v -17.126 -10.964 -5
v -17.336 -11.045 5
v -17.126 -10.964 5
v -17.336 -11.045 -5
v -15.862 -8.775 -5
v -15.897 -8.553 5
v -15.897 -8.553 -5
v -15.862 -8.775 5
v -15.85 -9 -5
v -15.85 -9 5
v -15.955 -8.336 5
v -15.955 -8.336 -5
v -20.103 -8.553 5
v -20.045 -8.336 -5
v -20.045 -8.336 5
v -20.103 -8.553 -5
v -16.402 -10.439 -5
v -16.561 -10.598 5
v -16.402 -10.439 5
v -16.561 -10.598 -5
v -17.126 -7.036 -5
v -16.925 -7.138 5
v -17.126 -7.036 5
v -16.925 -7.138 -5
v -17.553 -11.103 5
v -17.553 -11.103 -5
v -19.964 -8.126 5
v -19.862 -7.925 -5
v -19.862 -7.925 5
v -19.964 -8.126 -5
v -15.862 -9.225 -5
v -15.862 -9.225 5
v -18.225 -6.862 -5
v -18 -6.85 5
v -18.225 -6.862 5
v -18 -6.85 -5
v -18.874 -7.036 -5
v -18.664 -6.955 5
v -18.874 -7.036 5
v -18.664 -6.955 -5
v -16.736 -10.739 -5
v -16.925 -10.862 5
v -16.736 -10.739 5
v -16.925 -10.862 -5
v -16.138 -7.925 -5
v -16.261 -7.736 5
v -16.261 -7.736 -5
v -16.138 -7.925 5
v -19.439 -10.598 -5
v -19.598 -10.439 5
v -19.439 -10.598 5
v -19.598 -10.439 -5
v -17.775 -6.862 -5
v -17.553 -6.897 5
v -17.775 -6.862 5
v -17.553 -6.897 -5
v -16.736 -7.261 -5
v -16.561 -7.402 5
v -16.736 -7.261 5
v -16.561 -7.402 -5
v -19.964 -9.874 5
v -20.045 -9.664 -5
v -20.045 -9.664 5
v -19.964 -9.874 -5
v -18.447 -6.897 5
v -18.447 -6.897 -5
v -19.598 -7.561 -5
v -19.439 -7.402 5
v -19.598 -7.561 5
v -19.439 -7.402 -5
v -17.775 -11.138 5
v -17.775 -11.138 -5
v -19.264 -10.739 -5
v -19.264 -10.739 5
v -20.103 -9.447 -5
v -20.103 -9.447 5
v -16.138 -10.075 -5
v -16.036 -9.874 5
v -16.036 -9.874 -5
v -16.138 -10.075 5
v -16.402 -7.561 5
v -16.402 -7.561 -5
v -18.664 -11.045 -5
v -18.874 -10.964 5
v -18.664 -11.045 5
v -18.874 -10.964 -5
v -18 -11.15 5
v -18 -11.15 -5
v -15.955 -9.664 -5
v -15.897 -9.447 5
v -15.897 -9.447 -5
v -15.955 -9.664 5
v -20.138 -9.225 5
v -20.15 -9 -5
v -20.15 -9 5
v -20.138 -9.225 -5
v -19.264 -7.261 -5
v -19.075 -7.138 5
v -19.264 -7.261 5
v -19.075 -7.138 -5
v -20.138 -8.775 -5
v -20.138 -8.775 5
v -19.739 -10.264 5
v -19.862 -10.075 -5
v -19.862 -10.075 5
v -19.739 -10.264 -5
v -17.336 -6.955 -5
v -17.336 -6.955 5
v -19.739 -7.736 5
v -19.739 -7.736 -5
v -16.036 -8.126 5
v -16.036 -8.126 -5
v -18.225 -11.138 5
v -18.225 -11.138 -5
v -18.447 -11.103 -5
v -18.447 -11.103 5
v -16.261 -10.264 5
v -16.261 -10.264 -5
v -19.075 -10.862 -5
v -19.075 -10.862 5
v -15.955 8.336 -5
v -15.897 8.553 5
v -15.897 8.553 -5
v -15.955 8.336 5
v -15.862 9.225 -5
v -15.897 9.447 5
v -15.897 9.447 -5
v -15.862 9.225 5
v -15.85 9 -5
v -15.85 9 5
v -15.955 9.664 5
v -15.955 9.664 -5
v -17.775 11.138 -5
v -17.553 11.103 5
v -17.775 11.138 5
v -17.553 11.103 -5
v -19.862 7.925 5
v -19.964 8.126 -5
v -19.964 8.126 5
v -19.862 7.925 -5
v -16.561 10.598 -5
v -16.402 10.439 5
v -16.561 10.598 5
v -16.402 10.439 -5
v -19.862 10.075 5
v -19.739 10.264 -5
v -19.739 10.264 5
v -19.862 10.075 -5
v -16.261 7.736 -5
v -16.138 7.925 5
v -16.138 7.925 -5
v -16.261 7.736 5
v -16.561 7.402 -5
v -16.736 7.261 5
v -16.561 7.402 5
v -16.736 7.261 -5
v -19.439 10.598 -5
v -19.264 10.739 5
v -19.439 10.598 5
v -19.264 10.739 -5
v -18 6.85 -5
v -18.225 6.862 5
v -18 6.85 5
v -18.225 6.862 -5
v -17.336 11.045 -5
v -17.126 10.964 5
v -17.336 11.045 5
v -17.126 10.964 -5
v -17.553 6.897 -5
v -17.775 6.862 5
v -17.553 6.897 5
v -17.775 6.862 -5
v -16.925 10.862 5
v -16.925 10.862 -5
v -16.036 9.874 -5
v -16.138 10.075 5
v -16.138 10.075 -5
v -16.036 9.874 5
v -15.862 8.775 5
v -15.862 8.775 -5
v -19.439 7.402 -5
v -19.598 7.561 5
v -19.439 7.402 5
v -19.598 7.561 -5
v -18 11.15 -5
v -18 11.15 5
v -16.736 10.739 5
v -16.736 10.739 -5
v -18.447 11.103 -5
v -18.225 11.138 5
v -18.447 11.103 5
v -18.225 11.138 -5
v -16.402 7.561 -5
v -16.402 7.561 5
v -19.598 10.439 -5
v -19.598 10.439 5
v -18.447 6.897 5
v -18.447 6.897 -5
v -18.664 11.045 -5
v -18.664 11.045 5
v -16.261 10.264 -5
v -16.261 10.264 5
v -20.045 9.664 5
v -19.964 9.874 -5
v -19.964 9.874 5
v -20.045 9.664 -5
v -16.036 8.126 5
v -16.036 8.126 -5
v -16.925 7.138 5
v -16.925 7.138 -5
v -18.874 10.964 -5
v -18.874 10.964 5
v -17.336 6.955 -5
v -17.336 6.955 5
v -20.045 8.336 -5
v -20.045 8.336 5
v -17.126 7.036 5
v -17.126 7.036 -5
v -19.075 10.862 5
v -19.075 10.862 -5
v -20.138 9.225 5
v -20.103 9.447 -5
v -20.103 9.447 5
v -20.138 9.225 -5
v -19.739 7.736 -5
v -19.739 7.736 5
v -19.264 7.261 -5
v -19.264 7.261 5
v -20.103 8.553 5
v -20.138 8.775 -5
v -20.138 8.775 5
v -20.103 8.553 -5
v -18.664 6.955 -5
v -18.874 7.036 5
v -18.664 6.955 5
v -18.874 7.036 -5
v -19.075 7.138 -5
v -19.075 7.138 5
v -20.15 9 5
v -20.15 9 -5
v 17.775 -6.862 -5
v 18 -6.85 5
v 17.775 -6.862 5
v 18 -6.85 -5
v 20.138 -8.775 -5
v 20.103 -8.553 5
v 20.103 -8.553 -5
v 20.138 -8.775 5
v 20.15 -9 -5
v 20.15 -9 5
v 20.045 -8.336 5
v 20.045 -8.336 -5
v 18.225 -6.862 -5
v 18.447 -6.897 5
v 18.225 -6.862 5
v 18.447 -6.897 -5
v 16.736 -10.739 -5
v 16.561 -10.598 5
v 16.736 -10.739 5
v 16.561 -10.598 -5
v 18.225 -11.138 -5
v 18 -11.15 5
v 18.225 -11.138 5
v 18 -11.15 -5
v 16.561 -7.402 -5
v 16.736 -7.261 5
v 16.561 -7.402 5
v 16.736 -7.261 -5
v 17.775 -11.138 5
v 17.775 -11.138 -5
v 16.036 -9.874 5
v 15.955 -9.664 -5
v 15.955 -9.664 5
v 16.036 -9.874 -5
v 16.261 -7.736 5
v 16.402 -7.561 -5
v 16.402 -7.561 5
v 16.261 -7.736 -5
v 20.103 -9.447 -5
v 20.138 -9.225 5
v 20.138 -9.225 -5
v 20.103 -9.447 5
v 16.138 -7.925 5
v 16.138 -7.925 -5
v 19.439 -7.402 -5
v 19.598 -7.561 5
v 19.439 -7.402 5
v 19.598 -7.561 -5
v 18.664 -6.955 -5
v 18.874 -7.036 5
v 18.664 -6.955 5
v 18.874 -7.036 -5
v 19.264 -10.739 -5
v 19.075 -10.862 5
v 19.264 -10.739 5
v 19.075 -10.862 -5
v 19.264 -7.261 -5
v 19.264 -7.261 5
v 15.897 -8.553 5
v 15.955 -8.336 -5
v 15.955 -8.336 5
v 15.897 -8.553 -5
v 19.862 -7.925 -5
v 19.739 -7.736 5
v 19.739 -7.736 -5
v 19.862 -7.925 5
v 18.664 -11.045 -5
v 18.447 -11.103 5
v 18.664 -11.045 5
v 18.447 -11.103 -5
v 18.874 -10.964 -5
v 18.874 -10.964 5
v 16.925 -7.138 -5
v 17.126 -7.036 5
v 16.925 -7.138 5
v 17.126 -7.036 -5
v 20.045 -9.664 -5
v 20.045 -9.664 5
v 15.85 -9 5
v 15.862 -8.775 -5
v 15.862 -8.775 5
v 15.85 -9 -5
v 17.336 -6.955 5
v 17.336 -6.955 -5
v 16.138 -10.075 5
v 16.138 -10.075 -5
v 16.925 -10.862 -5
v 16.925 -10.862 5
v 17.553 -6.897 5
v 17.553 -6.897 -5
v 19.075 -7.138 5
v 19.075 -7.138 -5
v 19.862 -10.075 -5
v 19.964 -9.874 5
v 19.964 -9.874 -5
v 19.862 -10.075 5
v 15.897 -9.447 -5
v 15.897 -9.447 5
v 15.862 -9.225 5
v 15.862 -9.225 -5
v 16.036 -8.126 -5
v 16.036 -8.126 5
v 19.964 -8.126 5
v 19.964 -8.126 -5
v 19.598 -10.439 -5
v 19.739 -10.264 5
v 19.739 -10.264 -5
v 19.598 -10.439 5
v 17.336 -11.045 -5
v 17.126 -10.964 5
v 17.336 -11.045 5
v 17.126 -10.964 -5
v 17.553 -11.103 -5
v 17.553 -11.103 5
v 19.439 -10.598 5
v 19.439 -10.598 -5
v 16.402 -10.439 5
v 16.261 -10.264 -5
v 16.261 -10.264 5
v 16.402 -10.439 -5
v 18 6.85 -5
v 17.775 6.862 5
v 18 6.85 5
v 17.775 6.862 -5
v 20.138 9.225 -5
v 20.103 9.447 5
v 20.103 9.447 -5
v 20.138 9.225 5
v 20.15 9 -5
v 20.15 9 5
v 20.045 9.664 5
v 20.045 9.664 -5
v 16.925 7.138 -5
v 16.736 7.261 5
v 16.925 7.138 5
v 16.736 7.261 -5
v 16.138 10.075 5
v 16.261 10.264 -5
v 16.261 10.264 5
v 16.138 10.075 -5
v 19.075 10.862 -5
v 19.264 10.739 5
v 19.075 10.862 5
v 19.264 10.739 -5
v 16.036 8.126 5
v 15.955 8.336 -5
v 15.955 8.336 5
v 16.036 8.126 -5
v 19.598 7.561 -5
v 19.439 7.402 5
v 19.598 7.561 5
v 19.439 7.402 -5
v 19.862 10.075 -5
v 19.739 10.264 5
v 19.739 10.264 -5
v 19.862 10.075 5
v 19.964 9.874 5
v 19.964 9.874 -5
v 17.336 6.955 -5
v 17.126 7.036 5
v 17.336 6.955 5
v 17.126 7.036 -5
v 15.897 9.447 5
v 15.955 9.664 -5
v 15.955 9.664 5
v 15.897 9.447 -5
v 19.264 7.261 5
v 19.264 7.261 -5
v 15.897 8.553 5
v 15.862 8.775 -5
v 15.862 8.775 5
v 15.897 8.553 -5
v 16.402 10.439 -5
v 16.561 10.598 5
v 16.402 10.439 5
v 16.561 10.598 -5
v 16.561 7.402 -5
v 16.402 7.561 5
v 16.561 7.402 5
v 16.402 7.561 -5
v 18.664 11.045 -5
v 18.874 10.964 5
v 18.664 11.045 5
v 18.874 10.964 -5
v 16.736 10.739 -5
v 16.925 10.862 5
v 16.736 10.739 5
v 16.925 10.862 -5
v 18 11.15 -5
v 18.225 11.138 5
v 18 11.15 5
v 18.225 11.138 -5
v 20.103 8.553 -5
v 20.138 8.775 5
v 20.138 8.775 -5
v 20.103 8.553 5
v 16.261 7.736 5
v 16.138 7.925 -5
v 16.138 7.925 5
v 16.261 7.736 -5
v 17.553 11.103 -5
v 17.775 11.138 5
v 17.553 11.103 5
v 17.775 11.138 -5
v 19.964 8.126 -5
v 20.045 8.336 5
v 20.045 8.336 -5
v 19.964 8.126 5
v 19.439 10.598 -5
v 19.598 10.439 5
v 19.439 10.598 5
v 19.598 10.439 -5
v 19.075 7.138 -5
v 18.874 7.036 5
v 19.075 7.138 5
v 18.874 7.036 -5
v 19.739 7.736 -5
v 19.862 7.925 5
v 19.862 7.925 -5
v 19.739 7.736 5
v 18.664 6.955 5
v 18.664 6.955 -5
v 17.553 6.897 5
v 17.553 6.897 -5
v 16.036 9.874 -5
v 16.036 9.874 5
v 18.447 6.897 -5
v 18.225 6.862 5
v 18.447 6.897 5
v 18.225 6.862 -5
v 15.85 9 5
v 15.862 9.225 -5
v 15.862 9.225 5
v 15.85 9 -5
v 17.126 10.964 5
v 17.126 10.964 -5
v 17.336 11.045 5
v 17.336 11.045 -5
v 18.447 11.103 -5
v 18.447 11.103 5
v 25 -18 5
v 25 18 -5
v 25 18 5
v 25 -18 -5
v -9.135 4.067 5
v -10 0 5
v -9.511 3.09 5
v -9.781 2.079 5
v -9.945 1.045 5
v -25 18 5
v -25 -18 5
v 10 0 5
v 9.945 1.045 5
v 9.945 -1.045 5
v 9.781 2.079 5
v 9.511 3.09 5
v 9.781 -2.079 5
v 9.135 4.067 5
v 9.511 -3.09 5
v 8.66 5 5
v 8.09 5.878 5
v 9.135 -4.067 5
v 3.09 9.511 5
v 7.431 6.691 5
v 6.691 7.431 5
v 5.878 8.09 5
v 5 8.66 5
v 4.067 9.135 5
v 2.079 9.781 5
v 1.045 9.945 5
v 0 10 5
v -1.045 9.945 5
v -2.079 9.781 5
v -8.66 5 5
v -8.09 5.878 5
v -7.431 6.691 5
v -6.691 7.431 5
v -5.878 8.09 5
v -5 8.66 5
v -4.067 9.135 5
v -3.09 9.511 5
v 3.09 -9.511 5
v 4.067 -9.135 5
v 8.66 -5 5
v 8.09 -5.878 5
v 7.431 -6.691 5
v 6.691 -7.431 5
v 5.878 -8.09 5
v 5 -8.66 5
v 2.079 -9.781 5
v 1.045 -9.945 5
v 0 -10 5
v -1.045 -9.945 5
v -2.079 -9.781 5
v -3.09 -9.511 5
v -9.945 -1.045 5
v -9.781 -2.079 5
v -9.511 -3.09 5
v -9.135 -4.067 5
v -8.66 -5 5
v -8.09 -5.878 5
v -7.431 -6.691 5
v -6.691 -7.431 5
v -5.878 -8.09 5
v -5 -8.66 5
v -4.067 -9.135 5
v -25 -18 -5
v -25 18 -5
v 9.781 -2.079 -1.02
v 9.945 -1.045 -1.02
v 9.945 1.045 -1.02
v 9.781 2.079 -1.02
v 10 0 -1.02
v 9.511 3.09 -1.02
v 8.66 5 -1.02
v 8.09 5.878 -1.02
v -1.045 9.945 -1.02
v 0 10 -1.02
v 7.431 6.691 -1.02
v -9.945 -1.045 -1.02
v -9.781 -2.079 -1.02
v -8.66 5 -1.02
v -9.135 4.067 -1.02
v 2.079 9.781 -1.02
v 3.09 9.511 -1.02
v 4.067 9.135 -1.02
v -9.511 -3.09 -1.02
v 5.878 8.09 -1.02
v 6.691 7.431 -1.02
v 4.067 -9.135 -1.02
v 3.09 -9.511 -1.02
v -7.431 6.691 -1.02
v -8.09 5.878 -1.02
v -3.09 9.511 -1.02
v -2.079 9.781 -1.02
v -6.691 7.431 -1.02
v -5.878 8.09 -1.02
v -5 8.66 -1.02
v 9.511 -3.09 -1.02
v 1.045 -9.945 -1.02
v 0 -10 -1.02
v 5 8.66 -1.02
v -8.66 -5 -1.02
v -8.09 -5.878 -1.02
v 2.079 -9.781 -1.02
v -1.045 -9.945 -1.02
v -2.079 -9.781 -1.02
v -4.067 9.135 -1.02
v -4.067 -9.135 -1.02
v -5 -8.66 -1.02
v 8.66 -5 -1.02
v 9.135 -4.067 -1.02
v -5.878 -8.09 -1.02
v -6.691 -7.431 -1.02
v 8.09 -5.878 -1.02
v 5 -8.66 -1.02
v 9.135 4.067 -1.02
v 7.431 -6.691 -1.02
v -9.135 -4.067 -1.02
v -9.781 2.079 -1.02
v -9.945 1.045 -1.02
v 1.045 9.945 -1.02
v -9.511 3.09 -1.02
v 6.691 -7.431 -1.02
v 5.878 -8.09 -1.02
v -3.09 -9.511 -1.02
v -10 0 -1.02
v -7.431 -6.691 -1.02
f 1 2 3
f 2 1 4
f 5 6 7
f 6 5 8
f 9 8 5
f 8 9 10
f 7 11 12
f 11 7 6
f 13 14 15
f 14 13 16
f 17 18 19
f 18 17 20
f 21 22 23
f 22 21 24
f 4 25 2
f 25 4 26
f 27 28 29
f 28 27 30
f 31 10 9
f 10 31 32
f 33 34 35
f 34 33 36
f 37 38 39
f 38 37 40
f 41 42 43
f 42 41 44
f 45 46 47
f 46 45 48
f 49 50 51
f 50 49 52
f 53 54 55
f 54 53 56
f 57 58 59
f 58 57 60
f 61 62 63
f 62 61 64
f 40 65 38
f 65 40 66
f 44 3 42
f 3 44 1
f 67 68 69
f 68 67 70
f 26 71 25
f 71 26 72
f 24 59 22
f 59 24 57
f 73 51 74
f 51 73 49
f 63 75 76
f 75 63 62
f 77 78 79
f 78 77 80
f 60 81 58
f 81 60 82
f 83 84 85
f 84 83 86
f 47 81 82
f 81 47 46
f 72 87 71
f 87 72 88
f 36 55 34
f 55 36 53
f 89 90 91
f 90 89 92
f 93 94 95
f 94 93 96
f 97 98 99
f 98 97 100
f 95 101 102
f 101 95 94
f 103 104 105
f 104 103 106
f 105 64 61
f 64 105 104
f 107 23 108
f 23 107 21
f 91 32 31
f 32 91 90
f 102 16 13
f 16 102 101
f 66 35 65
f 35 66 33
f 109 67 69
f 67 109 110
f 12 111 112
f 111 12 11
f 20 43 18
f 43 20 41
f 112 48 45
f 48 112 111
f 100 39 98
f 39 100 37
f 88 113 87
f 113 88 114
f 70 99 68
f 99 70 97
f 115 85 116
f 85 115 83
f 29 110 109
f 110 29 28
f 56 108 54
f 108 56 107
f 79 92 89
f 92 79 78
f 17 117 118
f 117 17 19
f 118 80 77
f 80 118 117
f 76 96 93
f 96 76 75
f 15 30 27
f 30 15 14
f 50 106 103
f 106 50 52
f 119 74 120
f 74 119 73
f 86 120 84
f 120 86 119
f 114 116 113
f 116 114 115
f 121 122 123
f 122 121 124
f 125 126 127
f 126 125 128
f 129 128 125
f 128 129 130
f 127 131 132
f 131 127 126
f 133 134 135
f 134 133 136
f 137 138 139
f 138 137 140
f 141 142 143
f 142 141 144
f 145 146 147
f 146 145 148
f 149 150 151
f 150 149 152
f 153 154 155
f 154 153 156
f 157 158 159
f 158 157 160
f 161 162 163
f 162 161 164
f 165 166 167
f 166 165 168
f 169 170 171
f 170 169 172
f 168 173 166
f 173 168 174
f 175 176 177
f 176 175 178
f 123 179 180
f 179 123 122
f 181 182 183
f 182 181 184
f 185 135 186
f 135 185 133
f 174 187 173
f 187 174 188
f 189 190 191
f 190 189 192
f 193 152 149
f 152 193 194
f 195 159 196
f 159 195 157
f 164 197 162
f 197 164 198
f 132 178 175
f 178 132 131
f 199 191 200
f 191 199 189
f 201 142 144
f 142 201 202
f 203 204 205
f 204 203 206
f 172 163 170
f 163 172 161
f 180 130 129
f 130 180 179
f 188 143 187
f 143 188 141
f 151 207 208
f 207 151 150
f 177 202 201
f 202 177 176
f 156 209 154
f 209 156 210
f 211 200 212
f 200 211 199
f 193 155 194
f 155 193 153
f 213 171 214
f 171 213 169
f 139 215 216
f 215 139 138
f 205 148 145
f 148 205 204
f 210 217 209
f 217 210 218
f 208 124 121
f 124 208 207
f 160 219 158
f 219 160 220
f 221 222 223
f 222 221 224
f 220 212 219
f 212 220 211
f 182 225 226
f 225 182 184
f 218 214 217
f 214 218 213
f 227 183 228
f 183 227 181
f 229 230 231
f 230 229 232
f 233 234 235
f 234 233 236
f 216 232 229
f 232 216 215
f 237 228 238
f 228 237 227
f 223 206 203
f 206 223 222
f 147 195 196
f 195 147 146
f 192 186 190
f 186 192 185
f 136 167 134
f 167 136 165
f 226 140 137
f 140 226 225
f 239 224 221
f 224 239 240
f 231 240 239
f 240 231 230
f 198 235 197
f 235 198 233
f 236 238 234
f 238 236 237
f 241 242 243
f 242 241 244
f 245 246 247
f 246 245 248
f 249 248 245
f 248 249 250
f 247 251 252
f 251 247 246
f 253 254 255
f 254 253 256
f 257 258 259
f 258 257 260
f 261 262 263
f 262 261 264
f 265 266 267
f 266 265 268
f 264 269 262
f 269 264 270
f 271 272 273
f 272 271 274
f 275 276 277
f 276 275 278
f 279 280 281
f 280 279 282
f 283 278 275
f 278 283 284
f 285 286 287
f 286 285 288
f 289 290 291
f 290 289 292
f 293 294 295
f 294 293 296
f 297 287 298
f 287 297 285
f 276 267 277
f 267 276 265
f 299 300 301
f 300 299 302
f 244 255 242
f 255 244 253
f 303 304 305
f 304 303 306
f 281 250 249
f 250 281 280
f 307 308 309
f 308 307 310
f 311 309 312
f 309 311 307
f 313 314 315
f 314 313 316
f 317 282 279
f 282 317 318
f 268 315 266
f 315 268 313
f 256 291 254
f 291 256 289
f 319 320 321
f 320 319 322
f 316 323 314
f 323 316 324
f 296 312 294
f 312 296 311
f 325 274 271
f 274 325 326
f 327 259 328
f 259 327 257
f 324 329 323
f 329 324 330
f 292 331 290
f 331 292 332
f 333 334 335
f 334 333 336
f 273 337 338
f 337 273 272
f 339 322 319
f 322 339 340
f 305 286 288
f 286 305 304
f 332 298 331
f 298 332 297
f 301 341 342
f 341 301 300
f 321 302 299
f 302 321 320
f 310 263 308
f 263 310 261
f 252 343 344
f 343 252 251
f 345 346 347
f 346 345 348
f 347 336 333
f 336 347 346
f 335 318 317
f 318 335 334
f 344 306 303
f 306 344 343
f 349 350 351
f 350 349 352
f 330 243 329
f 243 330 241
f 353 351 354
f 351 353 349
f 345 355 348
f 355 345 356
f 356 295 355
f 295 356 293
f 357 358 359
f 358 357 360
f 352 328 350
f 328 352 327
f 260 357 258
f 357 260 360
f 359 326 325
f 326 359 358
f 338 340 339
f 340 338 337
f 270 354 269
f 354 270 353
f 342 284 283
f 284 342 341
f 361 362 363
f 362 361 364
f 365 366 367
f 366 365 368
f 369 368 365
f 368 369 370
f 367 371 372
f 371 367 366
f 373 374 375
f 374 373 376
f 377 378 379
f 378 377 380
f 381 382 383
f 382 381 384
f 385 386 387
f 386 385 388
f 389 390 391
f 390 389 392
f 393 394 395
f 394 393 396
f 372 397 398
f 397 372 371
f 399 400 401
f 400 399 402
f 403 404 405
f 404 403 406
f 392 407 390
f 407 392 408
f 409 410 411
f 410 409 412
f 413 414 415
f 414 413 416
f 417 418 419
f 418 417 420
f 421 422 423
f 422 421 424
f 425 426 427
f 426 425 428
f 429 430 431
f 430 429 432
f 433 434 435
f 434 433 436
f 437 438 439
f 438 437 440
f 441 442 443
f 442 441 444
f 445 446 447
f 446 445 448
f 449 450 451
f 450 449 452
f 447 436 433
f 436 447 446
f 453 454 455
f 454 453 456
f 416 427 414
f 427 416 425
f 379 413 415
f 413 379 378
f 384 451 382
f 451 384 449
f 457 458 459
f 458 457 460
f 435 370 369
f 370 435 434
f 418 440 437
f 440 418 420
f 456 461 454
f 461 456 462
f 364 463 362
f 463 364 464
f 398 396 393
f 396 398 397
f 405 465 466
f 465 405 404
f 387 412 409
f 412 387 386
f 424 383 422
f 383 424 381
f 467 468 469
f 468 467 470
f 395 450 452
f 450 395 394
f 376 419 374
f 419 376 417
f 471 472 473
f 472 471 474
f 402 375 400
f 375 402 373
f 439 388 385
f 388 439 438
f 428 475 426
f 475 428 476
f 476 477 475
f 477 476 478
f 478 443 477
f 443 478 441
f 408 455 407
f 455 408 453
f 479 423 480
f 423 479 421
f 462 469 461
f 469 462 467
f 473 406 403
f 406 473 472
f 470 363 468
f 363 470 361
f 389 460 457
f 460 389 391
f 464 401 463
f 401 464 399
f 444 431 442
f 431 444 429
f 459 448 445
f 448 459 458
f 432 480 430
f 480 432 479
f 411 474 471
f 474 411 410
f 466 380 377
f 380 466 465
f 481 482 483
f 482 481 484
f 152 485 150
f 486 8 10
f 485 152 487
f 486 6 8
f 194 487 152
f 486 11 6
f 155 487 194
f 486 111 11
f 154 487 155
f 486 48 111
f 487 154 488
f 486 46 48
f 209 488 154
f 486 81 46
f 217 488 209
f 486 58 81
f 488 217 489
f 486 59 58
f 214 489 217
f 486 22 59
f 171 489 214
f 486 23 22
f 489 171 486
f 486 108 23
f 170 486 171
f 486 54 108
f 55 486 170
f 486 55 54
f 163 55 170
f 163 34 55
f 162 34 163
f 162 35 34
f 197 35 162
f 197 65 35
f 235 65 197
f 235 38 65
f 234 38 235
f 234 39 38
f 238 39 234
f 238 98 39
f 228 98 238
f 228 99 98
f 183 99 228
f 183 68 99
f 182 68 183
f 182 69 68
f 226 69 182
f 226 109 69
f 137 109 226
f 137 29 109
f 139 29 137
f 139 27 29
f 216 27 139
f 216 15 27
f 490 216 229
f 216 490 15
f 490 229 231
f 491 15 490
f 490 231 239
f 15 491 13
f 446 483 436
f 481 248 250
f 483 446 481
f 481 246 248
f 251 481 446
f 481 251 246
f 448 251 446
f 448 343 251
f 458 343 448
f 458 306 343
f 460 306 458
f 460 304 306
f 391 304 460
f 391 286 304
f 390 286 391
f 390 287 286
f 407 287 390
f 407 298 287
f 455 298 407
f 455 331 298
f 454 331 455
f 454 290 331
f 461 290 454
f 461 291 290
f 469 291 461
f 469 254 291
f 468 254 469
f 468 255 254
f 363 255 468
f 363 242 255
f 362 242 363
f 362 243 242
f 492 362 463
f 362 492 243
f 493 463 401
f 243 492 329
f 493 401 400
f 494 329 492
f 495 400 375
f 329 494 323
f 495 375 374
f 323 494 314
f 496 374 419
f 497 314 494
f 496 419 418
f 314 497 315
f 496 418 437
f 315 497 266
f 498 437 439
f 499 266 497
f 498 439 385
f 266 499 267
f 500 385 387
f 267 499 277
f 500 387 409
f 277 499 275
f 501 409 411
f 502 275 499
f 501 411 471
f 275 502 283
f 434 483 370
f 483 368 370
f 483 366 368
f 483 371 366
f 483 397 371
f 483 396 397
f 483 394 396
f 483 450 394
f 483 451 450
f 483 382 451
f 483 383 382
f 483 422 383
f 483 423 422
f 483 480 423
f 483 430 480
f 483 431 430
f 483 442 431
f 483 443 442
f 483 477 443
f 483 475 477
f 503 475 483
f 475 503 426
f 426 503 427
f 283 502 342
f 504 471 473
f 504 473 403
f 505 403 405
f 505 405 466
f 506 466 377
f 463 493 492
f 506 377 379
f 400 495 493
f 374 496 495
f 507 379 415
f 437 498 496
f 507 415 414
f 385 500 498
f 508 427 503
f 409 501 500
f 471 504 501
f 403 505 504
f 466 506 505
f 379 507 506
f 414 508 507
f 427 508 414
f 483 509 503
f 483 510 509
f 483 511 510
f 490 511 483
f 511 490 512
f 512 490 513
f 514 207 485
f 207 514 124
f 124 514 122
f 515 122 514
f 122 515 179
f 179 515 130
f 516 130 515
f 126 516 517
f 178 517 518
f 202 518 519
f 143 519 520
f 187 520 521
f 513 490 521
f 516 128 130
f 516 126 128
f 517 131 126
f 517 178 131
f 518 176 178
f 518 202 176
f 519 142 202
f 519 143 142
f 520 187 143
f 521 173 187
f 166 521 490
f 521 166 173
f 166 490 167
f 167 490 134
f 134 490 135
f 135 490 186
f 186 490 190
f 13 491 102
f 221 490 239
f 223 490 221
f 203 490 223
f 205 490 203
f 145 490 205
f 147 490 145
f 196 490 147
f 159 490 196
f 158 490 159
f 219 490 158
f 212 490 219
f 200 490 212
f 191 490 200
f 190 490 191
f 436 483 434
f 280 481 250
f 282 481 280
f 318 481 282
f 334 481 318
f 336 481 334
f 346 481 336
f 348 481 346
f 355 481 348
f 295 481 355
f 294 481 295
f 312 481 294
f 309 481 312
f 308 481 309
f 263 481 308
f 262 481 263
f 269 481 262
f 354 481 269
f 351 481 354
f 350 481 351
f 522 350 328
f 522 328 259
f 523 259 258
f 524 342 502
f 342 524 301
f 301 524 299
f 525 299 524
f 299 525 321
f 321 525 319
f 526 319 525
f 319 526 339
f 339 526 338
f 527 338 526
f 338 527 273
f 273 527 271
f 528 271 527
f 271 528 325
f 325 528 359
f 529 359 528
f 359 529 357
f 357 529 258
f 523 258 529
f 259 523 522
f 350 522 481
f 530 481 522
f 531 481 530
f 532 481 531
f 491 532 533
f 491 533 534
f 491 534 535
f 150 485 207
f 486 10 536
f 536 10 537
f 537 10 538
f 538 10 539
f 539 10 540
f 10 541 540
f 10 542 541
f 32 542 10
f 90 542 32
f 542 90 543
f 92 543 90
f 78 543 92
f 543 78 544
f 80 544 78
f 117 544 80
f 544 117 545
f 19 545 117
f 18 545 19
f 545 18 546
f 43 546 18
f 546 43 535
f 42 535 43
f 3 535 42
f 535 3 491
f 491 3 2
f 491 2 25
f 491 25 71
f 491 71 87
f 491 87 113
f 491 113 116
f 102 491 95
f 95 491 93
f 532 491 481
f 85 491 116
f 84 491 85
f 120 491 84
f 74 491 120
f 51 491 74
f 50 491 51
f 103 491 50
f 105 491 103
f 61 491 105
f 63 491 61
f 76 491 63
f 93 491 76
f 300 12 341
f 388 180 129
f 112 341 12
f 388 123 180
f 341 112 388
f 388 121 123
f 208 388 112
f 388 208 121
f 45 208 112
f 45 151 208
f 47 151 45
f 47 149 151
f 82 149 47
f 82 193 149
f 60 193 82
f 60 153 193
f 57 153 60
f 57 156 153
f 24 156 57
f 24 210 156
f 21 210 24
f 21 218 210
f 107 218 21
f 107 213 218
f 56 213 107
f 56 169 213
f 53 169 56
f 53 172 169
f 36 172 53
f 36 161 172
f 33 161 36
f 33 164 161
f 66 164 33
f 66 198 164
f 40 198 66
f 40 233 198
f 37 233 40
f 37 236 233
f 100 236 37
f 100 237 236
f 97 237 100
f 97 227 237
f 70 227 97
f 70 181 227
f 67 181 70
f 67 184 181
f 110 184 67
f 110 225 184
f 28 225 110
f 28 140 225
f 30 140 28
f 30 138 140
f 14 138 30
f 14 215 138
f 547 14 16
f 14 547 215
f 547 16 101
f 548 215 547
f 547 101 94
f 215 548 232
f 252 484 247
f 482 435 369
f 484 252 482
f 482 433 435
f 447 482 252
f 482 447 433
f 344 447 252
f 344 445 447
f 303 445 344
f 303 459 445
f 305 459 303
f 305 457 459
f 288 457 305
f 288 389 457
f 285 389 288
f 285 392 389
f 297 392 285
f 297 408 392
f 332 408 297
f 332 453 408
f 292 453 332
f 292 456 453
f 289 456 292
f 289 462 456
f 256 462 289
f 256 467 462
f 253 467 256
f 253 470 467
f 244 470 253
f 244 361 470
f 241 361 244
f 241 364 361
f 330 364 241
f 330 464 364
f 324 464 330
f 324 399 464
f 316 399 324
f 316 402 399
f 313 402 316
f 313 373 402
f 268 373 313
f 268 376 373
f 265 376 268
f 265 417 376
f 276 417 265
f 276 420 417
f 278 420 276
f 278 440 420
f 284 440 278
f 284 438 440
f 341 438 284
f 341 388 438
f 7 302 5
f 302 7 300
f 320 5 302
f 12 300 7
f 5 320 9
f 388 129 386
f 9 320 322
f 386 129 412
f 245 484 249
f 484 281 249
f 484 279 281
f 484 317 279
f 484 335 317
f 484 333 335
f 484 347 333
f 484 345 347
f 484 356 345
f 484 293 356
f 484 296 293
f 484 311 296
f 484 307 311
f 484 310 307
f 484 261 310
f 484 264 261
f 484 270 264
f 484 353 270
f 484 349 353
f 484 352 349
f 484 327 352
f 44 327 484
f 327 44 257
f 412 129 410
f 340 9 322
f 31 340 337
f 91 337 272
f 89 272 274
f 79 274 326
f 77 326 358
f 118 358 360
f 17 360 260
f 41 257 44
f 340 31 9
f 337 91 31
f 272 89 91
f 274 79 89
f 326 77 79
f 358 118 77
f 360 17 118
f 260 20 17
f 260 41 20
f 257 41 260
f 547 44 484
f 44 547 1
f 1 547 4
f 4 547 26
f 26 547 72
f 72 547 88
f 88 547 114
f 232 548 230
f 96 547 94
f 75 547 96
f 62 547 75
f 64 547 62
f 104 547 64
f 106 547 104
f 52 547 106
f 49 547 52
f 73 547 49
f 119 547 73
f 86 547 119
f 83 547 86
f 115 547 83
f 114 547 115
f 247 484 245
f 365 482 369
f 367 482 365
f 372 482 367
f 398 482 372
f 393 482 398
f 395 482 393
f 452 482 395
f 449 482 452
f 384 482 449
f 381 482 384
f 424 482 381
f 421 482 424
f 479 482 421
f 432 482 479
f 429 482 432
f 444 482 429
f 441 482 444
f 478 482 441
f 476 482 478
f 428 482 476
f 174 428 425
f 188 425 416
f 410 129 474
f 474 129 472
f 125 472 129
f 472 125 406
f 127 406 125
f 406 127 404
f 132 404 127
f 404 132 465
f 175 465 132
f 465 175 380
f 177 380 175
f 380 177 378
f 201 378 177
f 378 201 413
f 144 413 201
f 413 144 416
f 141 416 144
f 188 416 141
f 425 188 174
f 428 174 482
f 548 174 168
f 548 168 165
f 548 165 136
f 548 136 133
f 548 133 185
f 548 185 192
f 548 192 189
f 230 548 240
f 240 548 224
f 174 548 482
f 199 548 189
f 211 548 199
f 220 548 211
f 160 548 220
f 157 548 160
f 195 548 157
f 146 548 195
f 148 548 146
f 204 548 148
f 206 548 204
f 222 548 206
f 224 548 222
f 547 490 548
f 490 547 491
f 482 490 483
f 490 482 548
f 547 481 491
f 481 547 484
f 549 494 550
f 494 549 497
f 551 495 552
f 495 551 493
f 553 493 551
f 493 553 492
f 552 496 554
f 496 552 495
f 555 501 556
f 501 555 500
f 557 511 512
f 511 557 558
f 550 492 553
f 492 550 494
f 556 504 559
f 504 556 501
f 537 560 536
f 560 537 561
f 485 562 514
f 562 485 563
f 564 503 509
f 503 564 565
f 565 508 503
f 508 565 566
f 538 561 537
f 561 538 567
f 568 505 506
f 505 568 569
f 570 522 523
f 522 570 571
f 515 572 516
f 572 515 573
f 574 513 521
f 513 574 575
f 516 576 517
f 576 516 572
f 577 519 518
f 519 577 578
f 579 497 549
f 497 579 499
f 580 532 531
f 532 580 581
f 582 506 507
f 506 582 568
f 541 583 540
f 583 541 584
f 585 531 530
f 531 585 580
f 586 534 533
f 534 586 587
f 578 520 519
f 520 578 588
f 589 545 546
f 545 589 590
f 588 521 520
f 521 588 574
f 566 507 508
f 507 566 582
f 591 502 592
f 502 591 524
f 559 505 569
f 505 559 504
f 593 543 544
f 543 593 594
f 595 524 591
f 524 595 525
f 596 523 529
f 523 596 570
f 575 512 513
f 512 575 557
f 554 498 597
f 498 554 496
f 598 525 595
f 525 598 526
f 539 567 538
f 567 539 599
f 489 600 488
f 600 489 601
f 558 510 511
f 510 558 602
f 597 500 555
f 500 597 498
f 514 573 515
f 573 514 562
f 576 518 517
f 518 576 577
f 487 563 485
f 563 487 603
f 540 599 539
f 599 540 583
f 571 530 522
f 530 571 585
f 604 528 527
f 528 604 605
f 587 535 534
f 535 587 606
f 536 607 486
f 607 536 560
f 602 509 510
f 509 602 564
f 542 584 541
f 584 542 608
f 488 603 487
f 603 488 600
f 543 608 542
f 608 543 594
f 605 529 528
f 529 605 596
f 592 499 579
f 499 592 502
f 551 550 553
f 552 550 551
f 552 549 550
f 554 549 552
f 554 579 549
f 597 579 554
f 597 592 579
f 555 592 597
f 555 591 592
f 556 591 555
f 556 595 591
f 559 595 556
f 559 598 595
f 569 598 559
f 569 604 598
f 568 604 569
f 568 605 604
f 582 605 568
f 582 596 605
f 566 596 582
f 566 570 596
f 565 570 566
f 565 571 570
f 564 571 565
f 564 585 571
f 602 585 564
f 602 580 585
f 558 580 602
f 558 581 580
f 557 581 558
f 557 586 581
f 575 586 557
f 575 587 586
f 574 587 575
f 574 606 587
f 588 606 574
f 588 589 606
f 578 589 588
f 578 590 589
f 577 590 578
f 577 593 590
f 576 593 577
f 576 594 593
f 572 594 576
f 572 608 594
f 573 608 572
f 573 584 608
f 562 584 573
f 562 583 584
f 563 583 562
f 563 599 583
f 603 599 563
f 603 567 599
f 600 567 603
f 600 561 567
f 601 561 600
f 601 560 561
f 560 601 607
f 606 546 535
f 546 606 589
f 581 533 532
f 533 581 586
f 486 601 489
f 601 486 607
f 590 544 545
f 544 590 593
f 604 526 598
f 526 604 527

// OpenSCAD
// Lead-screw nut holder with 20 mm pocket.
$fn = 60;
eps = 0.02;
body_l = 50;
body_w = 36;
body_t = 10;
pocket_d = 20;
pocket_depth = 6;
mount_x = 18.0;
difference() {
    cube([body_l, body_w, body_t], center = true);
    translate([0, 0, body_t / 2 - pocket_depth - eps]) cylinder(d = pocket_d, h = pocket_depth + 2 * eps);
    for (x = [-mount_x, mount_x], y = [-body_w / 4, body_w / 4])
        translate([x, y, -body_t / 2 - eps]) cylinder(d = 4.3, h = body_t + 2 * eps);
}
